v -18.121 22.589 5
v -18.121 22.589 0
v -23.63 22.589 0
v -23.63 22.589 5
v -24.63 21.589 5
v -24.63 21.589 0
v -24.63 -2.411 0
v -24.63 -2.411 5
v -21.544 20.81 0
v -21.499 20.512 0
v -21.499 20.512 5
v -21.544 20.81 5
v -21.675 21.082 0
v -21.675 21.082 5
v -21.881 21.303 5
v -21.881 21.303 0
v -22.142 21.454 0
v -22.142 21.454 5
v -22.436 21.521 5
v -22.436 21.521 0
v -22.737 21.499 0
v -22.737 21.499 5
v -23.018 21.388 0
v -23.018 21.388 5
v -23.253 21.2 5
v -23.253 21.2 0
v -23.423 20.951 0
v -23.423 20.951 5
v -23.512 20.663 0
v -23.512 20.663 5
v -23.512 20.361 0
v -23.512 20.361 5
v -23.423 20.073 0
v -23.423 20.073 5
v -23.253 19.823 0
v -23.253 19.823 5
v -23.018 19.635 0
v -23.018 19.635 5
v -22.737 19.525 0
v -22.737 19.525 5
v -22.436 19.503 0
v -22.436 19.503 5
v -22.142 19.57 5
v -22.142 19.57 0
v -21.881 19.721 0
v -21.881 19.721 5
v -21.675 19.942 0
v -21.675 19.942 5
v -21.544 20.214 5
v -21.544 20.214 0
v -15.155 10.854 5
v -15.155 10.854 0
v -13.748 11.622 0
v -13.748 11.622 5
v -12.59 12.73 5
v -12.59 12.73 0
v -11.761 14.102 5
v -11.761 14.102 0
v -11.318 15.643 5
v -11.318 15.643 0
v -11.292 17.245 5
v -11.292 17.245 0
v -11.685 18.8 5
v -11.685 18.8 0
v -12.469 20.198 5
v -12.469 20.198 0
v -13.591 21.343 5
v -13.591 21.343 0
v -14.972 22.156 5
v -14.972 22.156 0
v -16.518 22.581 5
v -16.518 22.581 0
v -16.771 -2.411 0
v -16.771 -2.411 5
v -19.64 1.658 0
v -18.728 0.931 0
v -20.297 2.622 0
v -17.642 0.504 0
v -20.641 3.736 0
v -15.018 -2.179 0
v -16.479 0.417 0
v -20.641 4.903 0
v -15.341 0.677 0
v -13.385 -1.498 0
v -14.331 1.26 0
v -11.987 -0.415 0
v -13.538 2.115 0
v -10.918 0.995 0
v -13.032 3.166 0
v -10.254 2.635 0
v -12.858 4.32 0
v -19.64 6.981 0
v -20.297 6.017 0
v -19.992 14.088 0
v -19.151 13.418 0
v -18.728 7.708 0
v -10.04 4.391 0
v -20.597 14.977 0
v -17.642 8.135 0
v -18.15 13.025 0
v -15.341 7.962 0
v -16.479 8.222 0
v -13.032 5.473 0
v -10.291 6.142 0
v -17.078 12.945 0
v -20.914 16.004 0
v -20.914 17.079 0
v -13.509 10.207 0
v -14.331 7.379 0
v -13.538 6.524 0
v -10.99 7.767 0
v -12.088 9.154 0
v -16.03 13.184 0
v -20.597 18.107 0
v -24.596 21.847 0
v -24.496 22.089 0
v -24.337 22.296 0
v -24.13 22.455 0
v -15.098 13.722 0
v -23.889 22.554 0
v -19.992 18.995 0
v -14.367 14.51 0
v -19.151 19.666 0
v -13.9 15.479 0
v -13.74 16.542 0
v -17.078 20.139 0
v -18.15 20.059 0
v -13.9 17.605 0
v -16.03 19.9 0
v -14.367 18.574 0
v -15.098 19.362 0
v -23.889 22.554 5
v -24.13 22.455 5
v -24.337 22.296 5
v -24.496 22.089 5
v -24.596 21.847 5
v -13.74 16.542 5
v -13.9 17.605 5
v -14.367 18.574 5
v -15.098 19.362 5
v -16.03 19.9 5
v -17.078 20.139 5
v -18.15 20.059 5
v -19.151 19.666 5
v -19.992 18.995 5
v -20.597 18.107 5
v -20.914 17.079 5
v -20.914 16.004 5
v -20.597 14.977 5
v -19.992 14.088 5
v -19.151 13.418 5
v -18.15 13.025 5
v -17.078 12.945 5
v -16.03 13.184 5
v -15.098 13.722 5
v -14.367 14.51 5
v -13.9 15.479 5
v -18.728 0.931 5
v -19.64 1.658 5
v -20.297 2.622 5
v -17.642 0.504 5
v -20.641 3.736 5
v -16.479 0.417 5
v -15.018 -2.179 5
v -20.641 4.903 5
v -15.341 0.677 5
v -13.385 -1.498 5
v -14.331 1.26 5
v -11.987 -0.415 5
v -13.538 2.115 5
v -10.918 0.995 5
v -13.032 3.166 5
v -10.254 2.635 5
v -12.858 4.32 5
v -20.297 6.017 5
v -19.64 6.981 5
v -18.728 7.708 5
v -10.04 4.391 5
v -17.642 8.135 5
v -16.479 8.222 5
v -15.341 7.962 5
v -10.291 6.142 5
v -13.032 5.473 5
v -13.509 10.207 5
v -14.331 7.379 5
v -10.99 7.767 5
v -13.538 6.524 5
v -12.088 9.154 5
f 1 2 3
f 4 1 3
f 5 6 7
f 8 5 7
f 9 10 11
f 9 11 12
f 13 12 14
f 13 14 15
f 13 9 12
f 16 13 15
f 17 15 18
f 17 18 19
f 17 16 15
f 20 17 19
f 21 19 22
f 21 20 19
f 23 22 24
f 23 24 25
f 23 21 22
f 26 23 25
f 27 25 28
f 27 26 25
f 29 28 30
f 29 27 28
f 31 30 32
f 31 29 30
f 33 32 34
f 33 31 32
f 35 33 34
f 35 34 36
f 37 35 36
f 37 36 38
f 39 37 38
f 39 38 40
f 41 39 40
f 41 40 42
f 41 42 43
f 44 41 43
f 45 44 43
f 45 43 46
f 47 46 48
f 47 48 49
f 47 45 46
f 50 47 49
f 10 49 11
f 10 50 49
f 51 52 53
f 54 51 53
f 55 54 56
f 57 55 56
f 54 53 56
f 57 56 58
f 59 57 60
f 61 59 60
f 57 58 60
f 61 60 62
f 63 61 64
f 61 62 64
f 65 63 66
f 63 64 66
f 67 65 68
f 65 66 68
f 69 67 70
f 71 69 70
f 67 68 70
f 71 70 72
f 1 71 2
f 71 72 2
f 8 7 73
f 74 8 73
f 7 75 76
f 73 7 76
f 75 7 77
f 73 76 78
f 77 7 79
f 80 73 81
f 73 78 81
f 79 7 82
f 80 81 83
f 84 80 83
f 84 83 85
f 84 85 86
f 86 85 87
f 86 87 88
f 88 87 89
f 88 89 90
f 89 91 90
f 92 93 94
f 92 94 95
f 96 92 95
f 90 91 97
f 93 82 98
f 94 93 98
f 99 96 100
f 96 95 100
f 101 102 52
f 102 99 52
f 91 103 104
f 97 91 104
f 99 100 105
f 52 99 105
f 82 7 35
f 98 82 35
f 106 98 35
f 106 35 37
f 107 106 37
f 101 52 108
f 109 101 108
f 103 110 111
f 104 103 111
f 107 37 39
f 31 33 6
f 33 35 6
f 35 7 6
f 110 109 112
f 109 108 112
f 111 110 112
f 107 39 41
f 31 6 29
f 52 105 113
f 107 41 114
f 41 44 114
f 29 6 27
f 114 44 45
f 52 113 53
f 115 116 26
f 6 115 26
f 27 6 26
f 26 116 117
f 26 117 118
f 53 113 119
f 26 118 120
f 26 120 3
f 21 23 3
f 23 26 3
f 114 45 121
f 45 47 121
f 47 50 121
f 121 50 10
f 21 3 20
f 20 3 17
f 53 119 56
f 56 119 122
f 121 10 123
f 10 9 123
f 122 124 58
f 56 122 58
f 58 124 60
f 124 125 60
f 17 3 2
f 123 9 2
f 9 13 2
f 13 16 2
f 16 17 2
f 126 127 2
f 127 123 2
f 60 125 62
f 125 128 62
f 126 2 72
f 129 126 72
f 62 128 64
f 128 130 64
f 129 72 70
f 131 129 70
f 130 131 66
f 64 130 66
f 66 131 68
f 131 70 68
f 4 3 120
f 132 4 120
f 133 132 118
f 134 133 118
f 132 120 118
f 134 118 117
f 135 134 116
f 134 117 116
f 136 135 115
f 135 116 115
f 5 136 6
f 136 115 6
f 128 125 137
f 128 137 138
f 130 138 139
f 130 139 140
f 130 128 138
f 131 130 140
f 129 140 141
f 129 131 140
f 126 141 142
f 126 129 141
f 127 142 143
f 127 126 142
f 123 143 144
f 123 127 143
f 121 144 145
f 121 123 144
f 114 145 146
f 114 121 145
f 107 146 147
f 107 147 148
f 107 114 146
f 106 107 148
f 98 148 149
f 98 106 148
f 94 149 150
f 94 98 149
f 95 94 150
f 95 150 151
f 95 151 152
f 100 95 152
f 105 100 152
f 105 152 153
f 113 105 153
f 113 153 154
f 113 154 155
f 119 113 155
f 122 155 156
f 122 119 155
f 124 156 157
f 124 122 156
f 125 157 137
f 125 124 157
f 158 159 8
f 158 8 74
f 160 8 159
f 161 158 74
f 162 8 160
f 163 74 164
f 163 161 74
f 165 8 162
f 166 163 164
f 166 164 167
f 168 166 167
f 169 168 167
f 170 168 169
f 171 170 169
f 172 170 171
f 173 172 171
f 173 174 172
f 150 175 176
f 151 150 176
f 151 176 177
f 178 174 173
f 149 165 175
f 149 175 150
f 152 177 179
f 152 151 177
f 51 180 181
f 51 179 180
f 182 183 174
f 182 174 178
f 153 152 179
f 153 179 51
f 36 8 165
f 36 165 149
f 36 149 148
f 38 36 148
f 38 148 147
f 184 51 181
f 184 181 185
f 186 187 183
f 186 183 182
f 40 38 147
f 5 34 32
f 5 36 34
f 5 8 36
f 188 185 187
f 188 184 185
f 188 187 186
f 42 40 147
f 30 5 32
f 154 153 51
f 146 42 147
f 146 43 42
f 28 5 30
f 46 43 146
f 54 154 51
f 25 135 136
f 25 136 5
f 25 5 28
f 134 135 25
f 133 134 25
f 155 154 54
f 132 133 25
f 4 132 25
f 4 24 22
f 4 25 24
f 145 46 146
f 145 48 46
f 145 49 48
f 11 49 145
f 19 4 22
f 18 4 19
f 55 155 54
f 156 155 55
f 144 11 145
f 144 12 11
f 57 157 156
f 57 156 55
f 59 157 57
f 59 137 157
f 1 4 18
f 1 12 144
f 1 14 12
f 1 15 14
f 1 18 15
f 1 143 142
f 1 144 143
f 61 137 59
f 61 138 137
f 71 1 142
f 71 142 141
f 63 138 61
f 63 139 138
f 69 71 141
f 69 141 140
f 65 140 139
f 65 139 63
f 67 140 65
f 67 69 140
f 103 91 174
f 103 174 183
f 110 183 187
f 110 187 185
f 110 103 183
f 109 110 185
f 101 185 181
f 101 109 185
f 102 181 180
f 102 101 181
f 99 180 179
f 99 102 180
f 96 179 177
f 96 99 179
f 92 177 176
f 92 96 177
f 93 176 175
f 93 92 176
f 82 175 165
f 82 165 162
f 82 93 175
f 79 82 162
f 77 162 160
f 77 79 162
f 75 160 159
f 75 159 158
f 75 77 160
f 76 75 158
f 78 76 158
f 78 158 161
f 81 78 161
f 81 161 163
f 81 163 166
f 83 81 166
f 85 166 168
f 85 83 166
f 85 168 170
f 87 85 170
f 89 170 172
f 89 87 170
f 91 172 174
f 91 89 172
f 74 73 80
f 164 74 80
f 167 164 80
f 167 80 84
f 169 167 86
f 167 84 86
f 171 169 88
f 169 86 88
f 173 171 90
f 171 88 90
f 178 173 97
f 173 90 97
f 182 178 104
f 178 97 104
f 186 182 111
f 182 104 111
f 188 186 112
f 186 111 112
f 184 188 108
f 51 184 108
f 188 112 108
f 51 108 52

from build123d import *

# Parameters (mm, degrees)
F0_R     = 3.913222
F0_R_2   = 1.012094
F0_R_3   = 3.607223
F1_DEPTH = 5


with BuildPart() as f1:
    # F0 (on Top) → F1 (new body)
    with BuildSketch(Plane.XY):
        with BuildLine():
            ThreePointArc((-23.629729, 22.588529), (-24.336836, 22.295636), (-24.629729, 21.588529))
            Line((-24.629729, 21.588529), (-24.629729, -2.411471))
            Line((-24.629729, -2.411471), (-16.771118, -2.411471))
            ThreePointArc((-16.771118, -2.411471), (-10.089518, 3.50554), (-15.155087, 10.853656))
            ThreePointArc((-15.155087, 10.853656), (-11.437269, 18.035431), (-18.120783, 22.588529))
            Line((-18.120783, 22.588529), (-23.629729, 22.588529))
        make_face()
        with Locations((-16.771118, 4.319529)):
            Circle(F0_R, mode=Mode.SUBTRACT)
        with Locations((-22.511555, 20.511821)):
            Circle(F0_R_2, mode=Mode.SUBTRACT)
        with Locations((-17.347449, 16.541781)):
            Circle(F0_R_3, mode=Mode.SUBTRACT)
    extrude(amount=F1_DEPTH)


solid = f1.part
